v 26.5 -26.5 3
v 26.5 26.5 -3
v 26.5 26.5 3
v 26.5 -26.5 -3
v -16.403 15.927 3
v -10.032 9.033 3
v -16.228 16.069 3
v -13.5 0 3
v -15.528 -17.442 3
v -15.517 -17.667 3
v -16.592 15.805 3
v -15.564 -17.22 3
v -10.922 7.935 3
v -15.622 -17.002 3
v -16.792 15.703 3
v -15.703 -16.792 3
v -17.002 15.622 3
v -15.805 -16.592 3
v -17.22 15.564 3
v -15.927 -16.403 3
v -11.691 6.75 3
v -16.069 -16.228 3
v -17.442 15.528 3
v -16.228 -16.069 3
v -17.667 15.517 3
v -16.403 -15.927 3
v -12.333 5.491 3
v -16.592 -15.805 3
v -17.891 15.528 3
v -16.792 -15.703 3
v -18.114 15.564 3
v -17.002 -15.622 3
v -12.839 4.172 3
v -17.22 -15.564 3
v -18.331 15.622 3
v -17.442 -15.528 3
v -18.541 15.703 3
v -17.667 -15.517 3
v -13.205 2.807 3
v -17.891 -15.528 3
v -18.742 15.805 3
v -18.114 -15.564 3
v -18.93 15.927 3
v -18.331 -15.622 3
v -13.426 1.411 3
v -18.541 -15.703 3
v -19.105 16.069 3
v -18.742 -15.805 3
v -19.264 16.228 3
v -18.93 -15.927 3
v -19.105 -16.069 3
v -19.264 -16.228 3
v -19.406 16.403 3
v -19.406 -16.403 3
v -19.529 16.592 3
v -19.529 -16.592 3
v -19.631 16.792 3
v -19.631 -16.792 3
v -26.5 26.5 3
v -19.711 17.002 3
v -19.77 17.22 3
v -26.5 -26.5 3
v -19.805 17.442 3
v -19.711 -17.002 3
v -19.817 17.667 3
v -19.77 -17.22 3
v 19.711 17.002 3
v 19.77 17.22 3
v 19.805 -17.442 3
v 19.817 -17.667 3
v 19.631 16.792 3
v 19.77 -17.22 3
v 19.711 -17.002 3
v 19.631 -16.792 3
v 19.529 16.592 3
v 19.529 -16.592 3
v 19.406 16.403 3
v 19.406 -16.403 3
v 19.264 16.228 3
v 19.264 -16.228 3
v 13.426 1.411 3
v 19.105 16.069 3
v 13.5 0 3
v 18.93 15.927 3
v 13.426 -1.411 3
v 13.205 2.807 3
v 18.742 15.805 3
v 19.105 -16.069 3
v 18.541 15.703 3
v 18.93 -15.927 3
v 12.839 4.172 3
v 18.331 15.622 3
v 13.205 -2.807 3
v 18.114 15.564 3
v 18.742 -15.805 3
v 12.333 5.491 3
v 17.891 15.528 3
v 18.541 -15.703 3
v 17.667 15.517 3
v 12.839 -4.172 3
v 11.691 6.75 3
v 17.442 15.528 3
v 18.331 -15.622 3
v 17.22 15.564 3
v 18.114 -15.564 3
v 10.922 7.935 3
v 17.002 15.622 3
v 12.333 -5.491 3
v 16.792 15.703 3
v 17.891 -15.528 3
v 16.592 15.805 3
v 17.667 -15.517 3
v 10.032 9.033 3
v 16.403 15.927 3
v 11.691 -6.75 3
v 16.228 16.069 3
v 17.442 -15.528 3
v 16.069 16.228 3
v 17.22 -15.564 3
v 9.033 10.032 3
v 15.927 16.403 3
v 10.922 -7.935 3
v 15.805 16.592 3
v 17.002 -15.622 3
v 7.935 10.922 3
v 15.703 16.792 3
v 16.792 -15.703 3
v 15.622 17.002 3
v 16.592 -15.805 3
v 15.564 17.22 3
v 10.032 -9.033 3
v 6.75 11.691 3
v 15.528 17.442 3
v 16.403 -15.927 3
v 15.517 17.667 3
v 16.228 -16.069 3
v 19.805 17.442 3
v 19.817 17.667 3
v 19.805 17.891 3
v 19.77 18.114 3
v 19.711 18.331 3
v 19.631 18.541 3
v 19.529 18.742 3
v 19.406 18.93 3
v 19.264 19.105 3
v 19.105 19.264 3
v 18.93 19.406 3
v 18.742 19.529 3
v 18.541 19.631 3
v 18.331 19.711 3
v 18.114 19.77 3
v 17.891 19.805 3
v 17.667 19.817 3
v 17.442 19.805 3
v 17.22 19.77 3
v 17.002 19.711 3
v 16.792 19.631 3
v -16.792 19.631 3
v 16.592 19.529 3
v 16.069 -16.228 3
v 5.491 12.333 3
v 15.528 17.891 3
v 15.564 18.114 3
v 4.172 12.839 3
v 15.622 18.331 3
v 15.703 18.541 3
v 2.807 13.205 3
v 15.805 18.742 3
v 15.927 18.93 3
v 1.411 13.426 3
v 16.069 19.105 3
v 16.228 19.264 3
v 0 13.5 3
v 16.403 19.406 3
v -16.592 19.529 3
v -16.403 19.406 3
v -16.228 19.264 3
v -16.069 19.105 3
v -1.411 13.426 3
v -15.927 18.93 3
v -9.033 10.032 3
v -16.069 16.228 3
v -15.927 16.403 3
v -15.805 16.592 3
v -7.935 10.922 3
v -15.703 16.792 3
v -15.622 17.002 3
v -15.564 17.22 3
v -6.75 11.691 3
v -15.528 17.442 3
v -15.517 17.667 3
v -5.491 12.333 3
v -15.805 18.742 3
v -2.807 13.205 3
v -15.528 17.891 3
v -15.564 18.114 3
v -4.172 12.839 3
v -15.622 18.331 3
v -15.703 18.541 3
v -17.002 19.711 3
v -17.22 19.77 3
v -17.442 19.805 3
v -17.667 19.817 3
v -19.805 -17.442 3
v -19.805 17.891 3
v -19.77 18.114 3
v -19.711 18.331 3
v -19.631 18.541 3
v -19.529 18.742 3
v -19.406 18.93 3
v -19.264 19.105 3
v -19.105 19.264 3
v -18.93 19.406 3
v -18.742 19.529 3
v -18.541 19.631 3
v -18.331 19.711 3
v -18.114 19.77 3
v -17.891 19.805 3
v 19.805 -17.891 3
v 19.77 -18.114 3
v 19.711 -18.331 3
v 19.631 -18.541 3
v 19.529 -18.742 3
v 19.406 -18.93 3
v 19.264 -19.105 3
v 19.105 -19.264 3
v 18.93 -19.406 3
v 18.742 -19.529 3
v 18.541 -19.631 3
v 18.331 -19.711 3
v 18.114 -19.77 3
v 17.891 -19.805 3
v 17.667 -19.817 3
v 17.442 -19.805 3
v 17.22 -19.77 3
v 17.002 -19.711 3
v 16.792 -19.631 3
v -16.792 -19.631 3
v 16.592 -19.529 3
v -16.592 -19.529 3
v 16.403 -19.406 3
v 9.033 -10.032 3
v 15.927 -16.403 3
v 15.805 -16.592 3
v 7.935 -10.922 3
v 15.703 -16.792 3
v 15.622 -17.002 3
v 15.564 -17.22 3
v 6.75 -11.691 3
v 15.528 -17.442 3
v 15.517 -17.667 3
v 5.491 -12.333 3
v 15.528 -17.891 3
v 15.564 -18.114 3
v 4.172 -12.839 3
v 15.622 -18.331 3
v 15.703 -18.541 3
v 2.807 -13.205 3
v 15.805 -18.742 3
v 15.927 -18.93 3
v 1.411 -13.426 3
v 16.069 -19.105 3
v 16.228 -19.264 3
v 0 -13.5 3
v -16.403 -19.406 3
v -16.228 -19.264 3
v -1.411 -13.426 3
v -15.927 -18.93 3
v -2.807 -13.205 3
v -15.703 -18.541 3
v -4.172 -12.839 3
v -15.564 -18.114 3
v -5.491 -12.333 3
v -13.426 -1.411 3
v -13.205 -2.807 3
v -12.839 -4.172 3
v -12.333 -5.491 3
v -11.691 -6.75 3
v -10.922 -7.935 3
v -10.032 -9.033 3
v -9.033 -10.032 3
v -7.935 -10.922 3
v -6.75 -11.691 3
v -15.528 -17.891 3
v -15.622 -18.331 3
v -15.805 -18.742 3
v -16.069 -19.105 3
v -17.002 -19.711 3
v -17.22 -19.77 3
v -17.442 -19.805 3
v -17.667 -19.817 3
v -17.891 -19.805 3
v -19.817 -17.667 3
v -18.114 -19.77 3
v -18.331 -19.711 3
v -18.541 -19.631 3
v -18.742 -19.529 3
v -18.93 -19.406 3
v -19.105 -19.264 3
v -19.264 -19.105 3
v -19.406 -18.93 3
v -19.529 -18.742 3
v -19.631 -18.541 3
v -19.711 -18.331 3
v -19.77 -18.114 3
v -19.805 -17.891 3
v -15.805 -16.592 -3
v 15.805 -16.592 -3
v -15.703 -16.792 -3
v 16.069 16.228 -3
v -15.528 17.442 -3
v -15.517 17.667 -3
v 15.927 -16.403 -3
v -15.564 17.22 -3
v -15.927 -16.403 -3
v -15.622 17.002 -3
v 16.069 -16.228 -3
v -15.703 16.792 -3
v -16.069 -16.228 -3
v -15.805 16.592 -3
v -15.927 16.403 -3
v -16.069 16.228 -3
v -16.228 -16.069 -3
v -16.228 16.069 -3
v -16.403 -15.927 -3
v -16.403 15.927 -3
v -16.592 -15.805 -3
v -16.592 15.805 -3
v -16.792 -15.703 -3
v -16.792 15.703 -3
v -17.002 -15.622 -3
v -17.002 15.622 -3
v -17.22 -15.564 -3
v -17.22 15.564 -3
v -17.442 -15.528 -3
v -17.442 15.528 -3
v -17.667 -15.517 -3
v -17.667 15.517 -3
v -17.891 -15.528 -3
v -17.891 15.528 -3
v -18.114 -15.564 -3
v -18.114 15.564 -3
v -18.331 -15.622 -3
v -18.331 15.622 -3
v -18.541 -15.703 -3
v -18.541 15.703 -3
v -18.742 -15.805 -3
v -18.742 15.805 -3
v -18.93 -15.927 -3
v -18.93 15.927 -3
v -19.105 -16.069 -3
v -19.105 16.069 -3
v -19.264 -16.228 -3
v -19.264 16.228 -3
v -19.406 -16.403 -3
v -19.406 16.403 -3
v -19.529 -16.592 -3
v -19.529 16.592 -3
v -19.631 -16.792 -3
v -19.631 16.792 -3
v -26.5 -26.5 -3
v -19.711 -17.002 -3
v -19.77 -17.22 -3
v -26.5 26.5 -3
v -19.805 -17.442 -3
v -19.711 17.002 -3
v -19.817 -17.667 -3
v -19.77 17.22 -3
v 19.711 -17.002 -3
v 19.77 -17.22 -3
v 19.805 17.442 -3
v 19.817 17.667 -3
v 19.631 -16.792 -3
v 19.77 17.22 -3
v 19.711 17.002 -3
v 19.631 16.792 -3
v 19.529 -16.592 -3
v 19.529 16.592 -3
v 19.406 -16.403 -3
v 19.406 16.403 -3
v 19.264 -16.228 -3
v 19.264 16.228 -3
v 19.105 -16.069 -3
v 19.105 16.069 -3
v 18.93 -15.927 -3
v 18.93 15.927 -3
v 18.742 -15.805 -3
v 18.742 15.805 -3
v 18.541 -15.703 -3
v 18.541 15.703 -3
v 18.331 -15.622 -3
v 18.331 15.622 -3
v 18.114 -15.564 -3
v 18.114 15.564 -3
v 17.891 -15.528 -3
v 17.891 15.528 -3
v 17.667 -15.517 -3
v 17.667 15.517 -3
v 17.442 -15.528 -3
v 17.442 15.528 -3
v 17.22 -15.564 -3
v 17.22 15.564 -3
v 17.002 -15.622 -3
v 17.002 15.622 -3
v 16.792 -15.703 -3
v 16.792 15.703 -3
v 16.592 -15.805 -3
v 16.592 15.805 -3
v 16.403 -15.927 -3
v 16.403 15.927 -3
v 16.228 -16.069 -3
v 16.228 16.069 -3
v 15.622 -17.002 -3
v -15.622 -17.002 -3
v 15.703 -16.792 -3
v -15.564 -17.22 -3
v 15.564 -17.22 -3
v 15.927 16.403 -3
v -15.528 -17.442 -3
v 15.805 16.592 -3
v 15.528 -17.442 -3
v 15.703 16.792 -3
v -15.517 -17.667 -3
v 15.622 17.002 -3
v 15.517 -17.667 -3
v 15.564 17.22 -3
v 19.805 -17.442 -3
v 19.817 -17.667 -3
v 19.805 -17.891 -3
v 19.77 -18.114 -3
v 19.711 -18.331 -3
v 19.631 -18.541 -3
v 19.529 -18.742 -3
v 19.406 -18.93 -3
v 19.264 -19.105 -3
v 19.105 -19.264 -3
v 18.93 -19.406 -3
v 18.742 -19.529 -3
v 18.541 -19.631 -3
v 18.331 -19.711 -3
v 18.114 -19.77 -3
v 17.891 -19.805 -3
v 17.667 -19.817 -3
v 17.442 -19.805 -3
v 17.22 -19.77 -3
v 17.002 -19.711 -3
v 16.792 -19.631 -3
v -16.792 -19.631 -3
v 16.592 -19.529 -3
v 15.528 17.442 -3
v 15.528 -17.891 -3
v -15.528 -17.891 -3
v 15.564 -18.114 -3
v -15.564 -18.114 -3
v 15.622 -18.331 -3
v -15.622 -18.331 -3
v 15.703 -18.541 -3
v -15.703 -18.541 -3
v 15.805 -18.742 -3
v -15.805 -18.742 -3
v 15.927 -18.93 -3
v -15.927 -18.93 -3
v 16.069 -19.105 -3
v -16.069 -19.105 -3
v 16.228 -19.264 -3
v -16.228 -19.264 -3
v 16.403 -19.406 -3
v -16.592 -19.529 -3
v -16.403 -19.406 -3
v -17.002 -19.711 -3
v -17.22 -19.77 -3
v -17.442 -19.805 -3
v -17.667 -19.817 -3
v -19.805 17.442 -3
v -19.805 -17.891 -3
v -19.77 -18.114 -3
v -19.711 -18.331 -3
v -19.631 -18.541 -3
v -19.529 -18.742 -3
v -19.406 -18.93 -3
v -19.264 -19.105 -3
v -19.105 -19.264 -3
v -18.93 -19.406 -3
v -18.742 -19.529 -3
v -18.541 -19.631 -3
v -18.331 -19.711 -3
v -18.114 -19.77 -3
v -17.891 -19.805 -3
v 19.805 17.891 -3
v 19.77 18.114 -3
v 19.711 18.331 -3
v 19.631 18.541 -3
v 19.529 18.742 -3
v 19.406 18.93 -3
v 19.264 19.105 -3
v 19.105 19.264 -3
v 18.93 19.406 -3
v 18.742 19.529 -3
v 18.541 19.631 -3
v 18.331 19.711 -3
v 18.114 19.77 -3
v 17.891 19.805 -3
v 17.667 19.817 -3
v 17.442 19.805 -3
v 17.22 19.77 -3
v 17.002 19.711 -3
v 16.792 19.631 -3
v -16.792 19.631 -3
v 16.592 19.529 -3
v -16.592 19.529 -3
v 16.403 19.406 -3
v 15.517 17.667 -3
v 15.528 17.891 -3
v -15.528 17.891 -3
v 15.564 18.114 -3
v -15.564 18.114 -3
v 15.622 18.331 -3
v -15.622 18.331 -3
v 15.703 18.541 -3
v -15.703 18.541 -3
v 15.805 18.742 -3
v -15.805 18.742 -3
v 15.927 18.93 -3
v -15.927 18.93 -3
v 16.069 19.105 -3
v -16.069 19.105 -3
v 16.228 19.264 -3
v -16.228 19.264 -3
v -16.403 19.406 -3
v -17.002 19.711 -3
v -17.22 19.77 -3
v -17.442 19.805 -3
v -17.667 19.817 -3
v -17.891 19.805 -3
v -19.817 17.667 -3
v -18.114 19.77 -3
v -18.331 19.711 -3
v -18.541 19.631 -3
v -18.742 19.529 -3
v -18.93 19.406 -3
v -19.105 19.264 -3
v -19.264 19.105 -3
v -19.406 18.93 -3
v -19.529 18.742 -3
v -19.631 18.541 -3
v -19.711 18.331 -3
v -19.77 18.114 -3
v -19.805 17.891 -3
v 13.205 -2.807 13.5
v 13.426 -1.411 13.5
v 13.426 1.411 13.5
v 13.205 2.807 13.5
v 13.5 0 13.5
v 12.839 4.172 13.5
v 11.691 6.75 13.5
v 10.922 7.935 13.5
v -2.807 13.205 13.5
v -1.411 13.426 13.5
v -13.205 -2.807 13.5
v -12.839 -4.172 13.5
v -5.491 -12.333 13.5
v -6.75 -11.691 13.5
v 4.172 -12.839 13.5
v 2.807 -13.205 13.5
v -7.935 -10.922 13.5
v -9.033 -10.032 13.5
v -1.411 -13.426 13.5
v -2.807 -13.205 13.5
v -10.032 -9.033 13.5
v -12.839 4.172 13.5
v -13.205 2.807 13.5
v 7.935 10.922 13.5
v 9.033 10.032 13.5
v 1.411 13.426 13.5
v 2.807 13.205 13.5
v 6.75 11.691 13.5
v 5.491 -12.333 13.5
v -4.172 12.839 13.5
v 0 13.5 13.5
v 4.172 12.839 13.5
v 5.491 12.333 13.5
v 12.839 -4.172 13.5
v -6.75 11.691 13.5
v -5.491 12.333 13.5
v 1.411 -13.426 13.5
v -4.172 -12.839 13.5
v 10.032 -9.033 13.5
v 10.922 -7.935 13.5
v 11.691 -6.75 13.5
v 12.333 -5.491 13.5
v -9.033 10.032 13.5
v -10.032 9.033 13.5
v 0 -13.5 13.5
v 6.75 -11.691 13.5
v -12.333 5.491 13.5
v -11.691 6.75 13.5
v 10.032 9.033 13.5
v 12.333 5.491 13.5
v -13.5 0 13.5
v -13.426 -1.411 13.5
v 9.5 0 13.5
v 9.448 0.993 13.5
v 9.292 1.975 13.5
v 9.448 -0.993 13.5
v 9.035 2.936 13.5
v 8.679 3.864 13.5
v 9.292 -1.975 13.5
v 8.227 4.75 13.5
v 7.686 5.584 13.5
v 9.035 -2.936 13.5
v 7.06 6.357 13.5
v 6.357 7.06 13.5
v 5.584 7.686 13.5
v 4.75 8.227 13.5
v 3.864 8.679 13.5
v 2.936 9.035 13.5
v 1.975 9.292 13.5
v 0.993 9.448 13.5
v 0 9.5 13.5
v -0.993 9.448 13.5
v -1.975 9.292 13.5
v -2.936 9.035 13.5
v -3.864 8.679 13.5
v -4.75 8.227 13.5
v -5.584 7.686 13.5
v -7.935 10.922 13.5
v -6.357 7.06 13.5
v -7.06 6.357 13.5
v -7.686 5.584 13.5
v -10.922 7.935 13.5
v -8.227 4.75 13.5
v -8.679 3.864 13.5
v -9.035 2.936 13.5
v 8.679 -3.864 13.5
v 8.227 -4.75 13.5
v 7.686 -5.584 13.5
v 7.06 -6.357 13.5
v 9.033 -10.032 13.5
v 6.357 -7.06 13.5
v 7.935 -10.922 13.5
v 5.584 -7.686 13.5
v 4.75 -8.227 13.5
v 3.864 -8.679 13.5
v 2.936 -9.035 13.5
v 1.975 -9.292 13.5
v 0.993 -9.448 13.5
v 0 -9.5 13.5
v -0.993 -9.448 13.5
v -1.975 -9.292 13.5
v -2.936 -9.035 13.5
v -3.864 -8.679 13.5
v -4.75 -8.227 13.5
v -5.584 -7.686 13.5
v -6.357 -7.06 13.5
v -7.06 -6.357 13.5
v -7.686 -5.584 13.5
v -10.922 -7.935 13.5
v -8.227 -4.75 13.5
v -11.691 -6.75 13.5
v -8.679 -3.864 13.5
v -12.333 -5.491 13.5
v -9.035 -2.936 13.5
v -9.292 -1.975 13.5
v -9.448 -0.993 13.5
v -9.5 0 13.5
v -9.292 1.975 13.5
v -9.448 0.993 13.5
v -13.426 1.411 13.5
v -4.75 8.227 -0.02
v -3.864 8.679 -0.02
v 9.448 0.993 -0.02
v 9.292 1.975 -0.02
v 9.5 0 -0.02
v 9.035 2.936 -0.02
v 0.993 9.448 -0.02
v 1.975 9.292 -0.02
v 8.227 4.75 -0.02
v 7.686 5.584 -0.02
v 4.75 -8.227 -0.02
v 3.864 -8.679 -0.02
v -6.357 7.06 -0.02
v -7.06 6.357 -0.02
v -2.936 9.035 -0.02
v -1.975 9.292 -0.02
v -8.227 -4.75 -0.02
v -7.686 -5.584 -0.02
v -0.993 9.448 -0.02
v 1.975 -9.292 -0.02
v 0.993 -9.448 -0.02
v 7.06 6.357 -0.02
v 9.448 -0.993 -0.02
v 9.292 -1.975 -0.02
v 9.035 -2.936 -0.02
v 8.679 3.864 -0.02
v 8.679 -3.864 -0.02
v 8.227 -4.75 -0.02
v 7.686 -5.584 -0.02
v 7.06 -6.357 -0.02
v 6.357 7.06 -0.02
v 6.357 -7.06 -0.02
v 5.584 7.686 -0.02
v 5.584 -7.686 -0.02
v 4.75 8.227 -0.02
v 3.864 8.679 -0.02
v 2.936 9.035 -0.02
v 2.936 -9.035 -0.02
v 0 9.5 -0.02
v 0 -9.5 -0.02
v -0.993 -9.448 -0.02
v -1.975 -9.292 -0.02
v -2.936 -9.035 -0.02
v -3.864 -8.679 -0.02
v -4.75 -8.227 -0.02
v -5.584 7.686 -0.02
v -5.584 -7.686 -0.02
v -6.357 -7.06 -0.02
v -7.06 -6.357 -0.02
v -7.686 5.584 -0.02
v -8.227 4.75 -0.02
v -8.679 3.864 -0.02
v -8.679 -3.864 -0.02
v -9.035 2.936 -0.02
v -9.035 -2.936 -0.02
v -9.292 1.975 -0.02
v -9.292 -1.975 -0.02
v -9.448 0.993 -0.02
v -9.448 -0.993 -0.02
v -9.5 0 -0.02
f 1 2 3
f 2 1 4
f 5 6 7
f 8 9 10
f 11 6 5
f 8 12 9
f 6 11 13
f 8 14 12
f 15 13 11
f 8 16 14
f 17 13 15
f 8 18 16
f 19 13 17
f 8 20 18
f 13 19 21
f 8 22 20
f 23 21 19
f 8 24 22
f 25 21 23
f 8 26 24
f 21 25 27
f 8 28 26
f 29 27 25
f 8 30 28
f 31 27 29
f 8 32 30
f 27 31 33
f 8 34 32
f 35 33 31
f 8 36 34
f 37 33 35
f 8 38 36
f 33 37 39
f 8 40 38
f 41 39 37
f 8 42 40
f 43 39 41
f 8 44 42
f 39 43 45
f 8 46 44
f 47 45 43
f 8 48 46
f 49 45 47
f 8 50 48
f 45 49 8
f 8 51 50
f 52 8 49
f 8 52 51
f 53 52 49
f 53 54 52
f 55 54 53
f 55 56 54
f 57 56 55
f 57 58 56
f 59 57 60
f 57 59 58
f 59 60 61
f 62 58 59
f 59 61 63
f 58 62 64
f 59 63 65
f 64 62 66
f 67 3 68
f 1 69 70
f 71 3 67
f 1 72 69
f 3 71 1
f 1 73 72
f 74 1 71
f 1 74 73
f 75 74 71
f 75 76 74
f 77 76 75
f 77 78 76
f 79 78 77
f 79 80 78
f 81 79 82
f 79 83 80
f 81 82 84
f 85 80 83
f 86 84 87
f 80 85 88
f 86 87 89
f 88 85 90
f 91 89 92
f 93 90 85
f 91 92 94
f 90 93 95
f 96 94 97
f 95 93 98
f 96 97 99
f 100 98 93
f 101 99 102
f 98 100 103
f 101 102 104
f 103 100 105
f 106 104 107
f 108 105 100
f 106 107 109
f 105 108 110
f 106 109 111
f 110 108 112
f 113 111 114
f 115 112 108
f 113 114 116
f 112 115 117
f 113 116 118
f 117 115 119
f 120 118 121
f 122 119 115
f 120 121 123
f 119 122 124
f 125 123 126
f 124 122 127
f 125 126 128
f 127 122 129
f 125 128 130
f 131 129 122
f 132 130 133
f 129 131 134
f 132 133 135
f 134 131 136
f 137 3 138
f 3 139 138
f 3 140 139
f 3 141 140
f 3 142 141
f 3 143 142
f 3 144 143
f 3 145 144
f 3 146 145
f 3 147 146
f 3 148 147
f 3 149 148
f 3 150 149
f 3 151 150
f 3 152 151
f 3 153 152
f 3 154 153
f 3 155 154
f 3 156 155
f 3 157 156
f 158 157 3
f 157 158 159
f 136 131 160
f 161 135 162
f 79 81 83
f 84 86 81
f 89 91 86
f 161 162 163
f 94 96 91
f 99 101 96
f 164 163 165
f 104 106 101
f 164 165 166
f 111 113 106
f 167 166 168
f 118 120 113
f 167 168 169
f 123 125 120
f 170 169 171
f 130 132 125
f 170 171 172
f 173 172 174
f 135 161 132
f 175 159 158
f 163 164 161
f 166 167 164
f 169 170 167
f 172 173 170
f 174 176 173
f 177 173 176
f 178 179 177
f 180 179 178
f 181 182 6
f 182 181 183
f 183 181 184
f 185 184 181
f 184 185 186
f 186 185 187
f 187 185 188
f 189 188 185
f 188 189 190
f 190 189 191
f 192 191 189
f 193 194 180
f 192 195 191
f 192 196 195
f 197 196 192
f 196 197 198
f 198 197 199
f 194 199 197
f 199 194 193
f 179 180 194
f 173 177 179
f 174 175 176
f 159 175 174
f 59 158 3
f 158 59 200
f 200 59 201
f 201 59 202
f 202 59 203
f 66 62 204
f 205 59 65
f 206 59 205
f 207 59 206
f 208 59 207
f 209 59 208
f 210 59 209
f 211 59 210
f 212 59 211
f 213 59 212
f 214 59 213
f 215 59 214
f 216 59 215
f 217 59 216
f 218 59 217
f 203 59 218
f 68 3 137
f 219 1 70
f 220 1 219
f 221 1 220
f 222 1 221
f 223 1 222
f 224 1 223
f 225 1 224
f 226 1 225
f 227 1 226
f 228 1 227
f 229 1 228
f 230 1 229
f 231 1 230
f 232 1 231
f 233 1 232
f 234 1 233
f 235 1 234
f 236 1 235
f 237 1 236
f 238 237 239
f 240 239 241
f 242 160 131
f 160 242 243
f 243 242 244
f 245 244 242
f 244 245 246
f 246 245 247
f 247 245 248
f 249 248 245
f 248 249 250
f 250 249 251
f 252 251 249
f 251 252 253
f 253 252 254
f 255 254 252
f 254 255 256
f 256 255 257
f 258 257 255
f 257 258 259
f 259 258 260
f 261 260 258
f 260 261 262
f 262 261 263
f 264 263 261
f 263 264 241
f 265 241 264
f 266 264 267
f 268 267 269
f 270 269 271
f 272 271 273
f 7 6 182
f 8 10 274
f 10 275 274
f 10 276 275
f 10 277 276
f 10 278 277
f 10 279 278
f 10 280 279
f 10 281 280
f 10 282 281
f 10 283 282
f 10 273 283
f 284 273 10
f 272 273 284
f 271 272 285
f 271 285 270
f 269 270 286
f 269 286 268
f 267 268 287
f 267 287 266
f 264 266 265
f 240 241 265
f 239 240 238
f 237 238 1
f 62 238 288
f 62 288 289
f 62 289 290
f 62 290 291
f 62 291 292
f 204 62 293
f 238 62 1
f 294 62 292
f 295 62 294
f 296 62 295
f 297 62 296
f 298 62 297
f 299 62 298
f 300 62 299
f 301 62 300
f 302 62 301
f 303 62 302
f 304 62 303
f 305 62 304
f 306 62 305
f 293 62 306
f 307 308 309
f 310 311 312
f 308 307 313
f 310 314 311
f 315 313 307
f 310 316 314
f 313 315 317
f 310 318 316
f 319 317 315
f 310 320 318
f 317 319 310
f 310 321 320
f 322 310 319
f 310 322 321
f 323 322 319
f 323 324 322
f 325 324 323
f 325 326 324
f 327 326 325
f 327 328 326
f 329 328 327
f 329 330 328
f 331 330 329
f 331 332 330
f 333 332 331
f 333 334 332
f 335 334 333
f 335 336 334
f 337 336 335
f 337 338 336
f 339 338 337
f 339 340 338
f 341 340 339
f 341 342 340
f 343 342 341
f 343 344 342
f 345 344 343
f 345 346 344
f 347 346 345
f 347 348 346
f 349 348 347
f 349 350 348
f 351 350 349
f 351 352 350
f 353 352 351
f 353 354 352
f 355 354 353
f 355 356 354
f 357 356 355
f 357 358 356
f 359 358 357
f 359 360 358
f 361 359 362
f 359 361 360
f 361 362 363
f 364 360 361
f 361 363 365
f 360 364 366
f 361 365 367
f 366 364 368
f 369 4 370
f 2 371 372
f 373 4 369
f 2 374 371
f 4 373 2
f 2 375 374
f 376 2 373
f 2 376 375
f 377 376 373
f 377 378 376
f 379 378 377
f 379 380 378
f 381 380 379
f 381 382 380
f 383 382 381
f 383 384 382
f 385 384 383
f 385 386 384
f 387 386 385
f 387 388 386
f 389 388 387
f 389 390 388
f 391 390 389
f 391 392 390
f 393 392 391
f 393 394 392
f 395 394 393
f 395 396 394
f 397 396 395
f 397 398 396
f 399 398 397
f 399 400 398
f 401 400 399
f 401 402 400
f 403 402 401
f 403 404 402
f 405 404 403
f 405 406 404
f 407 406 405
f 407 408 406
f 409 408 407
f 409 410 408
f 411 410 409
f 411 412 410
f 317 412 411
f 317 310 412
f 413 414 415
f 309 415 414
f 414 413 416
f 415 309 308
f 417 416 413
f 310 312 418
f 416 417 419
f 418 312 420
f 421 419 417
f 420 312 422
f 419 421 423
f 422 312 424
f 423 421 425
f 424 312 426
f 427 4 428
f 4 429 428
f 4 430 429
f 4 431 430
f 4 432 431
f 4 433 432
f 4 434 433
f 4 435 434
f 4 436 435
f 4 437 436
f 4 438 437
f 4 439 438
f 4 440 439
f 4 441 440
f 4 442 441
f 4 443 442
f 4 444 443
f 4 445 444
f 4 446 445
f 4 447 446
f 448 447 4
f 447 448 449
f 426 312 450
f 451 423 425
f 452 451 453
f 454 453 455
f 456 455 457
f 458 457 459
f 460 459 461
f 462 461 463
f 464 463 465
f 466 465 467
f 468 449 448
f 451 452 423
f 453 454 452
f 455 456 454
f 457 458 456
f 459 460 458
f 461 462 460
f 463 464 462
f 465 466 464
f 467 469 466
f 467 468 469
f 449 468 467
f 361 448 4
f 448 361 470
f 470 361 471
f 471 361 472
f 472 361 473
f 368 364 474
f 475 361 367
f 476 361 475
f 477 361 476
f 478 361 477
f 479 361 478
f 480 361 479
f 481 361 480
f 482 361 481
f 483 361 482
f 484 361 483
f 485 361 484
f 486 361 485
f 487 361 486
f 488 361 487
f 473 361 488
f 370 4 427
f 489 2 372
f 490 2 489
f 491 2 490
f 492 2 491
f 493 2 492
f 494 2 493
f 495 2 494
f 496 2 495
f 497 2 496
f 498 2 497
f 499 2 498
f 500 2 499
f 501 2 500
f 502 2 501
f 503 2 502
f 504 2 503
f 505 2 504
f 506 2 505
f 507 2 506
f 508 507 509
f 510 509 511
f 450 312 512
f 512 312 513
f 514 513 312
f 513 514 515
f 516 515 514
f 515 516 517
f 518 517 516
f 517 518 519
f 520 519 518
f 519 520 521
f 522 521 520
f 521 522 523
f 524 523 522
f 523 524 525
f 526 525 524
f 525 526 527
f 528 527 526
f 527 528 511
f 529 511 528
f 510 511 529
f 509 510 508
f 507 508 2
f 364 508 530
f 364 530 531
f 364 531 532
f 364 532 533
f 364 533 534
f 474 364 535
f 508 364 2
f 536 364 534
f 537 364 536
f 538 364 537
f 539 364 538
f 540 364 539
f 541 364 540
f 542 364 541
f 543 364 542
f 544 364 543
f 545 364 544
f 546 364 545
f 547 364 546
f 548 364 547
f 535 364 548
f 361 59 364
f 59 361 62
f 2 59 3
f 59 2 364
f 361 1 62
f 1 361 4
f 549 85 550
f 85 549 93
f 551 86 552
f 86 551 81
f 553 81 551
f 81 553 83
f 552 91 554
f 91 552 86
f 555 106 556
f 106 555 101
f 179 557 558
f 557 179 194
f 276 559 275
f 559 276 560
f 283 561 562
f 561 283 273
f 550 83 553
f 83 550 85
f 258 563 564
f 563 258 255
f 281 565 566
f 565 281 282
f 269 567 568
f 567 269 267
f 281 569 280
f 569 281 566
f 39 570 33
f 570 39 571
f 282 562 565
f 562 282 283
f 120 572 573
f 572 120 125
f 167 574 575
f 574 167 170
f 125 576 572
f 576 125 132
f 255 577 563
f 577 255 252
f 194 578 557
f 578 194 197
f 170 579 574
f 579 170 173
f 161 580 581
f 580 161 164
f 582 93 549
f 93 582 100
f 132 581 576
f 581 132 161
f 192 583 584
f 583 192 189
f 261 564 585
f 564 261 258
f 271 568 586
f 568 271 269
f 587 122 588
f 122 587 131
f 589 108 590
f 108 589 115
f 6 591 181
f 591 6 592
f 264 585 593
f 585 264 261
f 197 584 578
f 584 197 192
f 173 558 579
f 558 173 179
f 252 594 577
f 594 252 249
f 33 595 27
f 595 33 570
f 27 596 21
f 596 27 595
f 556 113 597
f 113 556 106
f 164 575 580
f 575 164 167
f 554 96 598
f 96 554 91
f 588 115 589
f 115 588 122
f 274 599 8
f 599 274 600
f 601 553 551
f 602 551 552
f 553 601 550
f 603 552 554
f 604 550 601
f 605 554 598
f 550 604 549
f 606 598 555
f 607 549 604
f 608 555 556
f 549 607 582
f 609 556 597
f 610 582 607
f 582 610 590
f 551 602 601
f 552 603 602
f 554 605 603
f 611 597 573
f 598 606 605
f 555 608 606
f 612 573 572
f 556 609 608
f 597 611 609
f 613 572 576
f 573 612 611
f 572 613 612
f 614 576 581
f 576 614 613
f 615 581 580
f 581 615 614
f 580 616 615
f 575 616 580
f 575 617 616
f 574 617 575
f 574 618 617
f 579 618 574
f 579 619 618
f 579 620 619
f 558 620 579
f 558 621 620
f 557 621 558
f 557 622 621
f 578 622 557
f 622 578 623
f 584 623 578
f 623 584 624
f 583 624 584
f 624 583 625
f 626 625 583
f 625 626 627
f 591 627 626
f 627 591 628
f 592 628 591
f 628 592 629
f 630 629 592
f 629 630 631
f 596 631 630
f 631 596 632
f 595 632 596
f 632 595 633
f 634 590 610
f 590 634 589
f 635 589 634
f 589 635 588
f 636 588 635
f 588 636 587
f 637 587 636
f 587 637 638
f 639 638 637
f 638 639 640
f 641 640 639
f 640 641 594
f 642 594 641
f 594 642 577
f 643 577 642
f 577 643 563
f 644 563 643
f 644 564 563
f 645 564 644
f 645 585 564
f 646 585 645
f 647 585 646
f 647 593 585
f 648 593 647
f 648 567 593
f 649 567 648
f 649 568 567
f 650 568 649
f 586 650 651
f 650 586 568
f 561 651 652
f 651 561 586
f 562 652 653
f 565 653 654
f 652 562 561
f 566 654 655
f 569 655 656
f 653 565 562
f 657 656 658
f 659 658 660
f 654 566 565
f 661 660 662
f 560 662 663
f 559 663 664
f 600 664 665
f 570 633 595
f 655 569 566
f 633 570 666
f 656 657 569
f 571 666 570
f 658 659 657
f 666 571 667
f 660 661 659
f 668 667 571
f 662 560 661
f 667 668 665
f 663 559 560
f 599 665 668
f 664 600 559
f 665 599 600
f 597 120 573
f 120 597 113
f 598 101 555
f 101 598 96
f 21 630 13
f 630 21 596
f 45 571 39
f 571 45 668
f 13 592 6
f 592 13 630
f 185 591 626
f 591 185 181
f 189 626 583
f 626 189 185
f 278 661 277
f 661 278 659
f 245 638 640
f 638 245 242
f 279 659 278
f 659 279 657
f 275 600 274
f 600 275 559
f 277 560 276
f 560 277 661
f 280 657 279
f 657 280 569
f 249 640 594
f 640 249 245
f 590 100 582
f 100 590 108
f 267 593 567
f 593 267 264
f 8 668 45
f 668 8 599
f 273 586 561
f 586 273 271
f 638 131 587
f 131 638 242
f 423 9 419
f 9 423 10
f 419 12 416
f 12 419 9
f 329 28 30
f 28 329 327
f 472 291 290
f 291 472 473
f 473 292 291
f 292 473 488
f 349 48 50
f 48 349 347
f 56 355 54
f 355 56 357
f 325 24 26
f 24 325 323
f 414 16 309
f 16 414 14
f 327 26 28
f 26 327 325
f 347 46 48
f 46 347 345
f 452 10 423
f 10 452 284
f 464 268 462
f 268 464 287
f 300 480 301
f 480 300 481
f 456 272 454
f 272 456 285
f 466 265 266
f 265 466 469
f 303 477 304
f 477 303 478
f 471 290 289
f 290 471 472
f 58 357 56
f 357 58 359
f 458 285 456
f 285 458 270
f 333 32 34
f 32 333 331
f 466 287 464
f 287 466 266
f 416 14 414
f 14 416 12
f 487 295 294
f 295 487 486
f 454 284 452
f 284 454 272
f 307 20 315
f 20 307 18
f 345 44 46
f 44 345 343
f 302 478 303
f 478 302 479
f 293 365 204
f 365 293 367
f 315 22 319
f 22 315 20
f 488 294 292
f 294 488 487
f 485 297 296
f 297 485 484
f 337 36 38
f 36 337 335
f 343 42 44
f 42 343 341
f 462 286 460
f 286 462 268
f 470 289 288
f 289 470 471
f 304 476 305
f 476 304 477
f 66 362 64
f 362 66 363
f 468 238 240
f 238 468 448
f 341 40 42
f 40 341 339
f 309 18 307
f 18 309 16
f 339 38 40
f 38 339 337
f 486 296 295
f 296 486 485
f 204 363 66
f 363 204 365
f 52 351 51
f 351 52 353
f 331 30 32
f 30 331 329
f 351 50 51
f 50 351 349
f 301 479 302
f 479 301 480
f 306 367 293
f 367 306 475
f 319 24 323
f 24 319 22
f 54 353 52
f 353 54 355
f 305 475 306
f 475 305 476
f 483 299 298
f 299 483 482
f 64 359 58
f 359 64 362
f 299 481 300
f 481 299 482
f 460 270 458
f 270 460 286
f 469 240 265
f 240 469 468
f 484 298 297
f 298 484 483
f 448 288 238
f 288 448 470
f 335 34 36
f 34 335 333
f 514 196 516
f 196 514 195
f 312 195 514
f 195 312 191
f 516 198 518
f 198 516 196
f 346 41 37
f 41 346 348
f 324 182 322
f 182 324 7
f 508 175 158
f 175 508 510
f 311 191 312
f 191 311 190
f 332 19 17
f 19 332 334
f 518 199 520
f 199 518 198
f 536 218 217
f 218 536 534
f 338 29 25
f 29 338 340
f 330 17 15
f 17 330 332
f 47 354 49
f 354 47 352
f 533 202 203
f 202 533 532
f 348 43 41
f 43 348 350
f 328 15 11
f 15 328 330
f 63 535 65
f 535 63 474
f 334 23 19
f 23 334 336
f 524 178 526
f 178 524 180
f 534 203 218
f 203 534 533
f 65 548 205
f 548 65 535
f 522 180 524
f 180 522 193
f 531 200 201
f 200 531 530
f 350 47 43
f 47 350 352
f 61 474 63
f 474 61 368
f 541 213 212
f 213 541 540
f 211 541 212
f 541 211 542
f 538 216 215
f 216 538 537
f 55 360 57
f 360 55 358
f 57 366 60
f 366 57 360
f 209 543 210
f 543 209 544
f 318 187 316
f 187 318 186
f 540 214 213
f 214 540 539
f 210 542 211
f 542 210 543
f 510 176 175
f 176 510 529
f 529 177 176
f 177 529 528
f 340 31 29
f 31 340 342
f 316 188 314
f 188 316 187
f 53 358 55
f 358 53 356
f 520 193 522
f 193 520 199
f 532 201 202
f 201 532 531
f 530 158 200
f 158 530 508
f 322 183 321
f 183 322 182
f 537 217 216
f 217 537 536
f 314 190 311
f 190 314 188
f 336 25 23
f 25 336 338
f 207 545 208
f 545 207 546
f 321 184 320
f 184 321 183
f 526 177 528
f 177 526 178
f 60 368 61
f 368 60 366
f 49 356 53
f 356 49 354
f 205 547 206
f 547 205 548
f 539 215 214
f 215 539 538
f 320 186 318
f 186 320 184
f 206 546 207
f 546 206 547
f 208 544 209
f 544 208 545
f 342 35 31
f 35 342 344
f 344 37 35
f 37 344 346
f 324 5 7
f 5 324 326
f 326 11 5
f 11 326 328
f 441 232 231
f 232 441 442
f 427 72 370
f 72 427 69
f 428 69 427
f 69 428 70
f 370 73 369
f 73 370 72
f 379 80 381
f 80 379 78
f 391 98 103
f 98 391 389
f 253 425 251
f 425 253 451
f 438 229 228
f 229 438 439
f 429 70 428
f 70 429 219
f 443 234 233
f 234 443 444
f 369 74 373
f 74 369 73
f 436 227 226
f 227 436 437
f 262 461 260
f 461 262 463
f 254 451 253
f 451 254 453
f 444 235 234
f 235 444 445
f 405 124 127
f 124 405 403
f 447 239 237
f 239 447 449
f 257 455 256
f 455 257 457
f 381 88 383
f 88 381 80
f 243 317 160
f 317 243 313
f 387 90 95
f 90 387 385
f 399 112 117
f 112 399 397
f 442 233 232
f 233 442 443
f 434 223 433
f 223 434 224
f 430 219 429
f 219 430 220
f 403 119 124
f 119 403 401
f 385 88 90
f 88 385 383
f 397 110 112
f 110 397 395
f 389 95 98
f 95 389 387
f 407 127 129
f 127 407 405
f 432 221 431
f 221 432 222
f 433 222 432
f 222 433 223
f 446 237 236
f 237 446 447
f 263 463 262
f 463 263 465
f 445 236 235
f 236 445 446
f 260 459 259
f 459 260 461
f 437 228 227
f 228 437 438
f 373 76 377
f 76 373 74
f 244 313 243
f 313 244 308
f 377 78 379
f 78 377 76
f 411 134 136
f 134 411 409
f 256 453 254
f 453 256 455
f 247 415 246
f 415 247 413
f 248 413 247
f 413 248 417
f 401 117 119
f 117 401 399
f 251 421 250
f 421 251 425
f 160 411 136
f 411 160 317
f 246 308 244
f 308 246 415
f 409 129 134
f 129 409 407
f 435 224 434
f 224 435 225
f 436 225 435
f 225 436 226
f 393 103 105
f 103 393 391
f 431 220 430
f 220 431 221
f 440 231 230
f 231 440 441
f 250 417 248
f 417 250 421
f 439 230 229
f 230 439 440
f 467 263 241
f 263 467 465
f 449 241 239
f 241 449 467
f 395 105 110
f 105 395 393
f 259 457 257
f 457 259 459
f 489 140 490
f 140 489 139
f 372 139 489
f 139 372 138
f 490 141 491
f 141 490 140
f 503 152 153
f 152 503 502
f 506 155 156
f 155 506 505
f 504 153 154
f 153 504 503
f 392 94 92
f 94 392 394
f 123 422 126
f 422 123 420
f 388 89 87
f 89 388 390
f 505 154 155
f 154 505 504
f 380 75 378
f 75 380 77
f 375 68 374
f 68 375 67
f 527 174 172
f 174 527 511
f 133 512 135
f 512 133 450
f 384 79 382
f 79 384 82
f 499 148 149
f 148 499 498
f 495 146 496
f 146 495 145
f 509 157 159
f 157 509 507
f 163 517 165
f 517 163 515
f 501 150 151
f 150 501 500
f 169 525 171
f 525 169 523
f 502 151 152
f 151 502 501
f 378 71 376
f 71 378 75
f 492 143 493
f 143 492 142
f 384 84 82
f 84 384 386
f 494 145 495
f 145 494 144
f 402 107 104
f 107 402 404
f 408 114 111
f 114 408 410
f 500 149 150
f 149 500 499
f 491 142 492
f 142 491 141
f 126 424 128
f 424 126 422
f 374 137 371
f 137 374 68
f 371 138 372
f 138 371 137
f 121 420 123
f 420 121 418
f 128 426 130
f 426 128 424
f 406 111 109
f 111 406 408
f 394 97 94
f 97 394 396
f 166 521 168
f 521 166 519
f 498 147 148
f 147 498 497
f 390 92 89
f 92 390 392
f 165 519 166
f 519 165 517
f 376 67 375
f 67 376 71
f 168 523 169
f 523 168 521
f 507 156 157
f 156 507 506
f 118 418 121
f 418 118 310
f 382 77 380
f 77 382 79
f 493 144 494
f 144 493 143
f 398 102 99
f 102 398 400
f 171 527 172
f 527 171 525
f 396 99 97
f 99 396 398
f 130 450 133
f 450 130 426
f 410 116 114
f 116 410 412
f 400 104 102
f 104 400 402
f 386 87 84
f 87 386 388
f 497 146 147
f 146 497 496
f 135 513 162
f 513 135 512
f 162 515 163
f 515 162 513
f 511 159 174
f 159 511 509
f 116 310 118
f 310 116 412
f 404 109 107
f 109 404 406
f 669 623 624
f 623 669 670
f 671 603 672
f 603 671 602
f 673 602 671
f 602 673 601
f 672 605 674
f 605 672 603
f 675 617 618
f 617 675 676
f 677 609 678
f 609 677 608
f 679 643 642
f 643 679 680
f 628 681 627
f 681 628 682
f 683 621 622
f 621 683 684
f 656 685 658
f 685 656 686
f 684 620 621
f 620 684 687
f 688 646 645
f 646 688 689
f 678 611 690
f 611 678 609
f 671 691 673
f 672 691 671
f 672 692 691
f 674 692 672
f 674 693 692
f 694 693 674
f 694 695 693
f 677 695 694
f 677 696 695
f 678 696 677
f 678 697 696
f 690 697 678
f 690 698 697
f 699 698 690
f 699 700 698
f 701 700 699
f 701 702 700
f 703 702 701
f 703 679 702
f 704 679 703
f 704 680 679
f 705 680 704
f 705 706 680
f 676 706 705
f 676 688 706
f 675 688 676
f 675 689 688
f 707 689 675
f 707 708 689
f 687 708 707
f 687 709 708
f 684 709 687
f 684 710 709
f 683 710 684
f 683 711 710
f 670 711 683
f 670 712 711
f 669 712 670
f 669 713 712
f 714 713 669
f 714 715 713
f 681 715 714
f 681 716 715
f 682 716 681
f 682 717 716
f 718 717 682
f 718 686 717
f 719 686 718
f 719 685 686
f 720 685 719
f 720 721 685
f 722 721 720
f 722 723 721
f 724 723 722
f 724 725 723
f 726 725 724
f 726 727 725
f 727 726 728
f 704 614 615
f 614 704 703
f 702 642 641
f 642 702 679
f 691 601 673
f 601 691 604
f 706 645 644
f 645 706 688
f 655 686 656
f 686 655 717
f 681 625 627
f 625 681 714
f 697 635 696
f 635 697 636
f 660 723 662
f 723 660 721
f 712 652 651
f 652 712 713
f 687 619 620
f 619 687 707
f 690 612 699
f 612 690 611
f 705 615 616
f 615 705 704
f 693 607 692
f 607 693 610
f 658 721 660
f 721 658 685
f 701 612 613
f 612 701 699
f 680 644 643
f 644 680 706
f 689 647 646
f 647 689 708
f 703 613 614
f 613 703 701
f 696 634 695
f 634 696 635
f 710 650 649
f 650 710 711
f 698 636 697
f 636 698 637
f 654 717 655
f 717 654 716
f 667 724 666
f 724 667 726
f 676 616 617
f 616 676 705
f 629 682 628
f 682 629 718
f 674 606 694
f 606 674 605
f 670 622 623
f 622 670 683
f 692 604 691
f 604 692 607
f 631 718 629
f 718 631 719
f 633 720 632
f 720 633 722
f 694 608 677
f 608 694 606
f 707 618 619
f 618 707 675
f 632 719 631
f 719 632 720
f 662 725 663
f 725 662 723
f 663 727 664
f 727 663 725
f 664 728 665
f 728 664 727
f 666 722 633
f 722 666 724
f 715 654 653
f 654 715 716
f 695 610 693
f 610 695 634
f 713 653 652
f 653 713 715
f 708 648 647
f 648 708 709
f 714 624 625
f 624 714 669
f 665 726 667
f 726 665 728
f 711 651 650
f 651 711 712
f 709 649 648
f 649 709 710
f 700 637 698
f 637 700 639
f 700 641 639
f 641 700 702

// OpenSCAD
// Flange bearing block for 19 mm bearing OD.
$fn = 60;
eps = 0.02;
bearing_d = 19;
plate_l = bearing_d + 34;
plate_t = 6;
hub_h = bearing_d / 2 + 4;
difference() {
    union() {
        cube([plate_l, plate_l, plate_t], center = true);
        cylinder(d = bearing_d + 8, h = hub_h);
    }
    translate([0, 0, -eps]) cylinder(d = bearing_d, h = hub_h + 2 * eps);
    for (x = [-plate_l / 3, plate_l / 3], y = [-plate_l / 3, plate_l / 3])
        translate([x, y, -plate_t / 2 - eps]) cylinder(d = 4.3, h = plate_t + 2 * eps);
}
